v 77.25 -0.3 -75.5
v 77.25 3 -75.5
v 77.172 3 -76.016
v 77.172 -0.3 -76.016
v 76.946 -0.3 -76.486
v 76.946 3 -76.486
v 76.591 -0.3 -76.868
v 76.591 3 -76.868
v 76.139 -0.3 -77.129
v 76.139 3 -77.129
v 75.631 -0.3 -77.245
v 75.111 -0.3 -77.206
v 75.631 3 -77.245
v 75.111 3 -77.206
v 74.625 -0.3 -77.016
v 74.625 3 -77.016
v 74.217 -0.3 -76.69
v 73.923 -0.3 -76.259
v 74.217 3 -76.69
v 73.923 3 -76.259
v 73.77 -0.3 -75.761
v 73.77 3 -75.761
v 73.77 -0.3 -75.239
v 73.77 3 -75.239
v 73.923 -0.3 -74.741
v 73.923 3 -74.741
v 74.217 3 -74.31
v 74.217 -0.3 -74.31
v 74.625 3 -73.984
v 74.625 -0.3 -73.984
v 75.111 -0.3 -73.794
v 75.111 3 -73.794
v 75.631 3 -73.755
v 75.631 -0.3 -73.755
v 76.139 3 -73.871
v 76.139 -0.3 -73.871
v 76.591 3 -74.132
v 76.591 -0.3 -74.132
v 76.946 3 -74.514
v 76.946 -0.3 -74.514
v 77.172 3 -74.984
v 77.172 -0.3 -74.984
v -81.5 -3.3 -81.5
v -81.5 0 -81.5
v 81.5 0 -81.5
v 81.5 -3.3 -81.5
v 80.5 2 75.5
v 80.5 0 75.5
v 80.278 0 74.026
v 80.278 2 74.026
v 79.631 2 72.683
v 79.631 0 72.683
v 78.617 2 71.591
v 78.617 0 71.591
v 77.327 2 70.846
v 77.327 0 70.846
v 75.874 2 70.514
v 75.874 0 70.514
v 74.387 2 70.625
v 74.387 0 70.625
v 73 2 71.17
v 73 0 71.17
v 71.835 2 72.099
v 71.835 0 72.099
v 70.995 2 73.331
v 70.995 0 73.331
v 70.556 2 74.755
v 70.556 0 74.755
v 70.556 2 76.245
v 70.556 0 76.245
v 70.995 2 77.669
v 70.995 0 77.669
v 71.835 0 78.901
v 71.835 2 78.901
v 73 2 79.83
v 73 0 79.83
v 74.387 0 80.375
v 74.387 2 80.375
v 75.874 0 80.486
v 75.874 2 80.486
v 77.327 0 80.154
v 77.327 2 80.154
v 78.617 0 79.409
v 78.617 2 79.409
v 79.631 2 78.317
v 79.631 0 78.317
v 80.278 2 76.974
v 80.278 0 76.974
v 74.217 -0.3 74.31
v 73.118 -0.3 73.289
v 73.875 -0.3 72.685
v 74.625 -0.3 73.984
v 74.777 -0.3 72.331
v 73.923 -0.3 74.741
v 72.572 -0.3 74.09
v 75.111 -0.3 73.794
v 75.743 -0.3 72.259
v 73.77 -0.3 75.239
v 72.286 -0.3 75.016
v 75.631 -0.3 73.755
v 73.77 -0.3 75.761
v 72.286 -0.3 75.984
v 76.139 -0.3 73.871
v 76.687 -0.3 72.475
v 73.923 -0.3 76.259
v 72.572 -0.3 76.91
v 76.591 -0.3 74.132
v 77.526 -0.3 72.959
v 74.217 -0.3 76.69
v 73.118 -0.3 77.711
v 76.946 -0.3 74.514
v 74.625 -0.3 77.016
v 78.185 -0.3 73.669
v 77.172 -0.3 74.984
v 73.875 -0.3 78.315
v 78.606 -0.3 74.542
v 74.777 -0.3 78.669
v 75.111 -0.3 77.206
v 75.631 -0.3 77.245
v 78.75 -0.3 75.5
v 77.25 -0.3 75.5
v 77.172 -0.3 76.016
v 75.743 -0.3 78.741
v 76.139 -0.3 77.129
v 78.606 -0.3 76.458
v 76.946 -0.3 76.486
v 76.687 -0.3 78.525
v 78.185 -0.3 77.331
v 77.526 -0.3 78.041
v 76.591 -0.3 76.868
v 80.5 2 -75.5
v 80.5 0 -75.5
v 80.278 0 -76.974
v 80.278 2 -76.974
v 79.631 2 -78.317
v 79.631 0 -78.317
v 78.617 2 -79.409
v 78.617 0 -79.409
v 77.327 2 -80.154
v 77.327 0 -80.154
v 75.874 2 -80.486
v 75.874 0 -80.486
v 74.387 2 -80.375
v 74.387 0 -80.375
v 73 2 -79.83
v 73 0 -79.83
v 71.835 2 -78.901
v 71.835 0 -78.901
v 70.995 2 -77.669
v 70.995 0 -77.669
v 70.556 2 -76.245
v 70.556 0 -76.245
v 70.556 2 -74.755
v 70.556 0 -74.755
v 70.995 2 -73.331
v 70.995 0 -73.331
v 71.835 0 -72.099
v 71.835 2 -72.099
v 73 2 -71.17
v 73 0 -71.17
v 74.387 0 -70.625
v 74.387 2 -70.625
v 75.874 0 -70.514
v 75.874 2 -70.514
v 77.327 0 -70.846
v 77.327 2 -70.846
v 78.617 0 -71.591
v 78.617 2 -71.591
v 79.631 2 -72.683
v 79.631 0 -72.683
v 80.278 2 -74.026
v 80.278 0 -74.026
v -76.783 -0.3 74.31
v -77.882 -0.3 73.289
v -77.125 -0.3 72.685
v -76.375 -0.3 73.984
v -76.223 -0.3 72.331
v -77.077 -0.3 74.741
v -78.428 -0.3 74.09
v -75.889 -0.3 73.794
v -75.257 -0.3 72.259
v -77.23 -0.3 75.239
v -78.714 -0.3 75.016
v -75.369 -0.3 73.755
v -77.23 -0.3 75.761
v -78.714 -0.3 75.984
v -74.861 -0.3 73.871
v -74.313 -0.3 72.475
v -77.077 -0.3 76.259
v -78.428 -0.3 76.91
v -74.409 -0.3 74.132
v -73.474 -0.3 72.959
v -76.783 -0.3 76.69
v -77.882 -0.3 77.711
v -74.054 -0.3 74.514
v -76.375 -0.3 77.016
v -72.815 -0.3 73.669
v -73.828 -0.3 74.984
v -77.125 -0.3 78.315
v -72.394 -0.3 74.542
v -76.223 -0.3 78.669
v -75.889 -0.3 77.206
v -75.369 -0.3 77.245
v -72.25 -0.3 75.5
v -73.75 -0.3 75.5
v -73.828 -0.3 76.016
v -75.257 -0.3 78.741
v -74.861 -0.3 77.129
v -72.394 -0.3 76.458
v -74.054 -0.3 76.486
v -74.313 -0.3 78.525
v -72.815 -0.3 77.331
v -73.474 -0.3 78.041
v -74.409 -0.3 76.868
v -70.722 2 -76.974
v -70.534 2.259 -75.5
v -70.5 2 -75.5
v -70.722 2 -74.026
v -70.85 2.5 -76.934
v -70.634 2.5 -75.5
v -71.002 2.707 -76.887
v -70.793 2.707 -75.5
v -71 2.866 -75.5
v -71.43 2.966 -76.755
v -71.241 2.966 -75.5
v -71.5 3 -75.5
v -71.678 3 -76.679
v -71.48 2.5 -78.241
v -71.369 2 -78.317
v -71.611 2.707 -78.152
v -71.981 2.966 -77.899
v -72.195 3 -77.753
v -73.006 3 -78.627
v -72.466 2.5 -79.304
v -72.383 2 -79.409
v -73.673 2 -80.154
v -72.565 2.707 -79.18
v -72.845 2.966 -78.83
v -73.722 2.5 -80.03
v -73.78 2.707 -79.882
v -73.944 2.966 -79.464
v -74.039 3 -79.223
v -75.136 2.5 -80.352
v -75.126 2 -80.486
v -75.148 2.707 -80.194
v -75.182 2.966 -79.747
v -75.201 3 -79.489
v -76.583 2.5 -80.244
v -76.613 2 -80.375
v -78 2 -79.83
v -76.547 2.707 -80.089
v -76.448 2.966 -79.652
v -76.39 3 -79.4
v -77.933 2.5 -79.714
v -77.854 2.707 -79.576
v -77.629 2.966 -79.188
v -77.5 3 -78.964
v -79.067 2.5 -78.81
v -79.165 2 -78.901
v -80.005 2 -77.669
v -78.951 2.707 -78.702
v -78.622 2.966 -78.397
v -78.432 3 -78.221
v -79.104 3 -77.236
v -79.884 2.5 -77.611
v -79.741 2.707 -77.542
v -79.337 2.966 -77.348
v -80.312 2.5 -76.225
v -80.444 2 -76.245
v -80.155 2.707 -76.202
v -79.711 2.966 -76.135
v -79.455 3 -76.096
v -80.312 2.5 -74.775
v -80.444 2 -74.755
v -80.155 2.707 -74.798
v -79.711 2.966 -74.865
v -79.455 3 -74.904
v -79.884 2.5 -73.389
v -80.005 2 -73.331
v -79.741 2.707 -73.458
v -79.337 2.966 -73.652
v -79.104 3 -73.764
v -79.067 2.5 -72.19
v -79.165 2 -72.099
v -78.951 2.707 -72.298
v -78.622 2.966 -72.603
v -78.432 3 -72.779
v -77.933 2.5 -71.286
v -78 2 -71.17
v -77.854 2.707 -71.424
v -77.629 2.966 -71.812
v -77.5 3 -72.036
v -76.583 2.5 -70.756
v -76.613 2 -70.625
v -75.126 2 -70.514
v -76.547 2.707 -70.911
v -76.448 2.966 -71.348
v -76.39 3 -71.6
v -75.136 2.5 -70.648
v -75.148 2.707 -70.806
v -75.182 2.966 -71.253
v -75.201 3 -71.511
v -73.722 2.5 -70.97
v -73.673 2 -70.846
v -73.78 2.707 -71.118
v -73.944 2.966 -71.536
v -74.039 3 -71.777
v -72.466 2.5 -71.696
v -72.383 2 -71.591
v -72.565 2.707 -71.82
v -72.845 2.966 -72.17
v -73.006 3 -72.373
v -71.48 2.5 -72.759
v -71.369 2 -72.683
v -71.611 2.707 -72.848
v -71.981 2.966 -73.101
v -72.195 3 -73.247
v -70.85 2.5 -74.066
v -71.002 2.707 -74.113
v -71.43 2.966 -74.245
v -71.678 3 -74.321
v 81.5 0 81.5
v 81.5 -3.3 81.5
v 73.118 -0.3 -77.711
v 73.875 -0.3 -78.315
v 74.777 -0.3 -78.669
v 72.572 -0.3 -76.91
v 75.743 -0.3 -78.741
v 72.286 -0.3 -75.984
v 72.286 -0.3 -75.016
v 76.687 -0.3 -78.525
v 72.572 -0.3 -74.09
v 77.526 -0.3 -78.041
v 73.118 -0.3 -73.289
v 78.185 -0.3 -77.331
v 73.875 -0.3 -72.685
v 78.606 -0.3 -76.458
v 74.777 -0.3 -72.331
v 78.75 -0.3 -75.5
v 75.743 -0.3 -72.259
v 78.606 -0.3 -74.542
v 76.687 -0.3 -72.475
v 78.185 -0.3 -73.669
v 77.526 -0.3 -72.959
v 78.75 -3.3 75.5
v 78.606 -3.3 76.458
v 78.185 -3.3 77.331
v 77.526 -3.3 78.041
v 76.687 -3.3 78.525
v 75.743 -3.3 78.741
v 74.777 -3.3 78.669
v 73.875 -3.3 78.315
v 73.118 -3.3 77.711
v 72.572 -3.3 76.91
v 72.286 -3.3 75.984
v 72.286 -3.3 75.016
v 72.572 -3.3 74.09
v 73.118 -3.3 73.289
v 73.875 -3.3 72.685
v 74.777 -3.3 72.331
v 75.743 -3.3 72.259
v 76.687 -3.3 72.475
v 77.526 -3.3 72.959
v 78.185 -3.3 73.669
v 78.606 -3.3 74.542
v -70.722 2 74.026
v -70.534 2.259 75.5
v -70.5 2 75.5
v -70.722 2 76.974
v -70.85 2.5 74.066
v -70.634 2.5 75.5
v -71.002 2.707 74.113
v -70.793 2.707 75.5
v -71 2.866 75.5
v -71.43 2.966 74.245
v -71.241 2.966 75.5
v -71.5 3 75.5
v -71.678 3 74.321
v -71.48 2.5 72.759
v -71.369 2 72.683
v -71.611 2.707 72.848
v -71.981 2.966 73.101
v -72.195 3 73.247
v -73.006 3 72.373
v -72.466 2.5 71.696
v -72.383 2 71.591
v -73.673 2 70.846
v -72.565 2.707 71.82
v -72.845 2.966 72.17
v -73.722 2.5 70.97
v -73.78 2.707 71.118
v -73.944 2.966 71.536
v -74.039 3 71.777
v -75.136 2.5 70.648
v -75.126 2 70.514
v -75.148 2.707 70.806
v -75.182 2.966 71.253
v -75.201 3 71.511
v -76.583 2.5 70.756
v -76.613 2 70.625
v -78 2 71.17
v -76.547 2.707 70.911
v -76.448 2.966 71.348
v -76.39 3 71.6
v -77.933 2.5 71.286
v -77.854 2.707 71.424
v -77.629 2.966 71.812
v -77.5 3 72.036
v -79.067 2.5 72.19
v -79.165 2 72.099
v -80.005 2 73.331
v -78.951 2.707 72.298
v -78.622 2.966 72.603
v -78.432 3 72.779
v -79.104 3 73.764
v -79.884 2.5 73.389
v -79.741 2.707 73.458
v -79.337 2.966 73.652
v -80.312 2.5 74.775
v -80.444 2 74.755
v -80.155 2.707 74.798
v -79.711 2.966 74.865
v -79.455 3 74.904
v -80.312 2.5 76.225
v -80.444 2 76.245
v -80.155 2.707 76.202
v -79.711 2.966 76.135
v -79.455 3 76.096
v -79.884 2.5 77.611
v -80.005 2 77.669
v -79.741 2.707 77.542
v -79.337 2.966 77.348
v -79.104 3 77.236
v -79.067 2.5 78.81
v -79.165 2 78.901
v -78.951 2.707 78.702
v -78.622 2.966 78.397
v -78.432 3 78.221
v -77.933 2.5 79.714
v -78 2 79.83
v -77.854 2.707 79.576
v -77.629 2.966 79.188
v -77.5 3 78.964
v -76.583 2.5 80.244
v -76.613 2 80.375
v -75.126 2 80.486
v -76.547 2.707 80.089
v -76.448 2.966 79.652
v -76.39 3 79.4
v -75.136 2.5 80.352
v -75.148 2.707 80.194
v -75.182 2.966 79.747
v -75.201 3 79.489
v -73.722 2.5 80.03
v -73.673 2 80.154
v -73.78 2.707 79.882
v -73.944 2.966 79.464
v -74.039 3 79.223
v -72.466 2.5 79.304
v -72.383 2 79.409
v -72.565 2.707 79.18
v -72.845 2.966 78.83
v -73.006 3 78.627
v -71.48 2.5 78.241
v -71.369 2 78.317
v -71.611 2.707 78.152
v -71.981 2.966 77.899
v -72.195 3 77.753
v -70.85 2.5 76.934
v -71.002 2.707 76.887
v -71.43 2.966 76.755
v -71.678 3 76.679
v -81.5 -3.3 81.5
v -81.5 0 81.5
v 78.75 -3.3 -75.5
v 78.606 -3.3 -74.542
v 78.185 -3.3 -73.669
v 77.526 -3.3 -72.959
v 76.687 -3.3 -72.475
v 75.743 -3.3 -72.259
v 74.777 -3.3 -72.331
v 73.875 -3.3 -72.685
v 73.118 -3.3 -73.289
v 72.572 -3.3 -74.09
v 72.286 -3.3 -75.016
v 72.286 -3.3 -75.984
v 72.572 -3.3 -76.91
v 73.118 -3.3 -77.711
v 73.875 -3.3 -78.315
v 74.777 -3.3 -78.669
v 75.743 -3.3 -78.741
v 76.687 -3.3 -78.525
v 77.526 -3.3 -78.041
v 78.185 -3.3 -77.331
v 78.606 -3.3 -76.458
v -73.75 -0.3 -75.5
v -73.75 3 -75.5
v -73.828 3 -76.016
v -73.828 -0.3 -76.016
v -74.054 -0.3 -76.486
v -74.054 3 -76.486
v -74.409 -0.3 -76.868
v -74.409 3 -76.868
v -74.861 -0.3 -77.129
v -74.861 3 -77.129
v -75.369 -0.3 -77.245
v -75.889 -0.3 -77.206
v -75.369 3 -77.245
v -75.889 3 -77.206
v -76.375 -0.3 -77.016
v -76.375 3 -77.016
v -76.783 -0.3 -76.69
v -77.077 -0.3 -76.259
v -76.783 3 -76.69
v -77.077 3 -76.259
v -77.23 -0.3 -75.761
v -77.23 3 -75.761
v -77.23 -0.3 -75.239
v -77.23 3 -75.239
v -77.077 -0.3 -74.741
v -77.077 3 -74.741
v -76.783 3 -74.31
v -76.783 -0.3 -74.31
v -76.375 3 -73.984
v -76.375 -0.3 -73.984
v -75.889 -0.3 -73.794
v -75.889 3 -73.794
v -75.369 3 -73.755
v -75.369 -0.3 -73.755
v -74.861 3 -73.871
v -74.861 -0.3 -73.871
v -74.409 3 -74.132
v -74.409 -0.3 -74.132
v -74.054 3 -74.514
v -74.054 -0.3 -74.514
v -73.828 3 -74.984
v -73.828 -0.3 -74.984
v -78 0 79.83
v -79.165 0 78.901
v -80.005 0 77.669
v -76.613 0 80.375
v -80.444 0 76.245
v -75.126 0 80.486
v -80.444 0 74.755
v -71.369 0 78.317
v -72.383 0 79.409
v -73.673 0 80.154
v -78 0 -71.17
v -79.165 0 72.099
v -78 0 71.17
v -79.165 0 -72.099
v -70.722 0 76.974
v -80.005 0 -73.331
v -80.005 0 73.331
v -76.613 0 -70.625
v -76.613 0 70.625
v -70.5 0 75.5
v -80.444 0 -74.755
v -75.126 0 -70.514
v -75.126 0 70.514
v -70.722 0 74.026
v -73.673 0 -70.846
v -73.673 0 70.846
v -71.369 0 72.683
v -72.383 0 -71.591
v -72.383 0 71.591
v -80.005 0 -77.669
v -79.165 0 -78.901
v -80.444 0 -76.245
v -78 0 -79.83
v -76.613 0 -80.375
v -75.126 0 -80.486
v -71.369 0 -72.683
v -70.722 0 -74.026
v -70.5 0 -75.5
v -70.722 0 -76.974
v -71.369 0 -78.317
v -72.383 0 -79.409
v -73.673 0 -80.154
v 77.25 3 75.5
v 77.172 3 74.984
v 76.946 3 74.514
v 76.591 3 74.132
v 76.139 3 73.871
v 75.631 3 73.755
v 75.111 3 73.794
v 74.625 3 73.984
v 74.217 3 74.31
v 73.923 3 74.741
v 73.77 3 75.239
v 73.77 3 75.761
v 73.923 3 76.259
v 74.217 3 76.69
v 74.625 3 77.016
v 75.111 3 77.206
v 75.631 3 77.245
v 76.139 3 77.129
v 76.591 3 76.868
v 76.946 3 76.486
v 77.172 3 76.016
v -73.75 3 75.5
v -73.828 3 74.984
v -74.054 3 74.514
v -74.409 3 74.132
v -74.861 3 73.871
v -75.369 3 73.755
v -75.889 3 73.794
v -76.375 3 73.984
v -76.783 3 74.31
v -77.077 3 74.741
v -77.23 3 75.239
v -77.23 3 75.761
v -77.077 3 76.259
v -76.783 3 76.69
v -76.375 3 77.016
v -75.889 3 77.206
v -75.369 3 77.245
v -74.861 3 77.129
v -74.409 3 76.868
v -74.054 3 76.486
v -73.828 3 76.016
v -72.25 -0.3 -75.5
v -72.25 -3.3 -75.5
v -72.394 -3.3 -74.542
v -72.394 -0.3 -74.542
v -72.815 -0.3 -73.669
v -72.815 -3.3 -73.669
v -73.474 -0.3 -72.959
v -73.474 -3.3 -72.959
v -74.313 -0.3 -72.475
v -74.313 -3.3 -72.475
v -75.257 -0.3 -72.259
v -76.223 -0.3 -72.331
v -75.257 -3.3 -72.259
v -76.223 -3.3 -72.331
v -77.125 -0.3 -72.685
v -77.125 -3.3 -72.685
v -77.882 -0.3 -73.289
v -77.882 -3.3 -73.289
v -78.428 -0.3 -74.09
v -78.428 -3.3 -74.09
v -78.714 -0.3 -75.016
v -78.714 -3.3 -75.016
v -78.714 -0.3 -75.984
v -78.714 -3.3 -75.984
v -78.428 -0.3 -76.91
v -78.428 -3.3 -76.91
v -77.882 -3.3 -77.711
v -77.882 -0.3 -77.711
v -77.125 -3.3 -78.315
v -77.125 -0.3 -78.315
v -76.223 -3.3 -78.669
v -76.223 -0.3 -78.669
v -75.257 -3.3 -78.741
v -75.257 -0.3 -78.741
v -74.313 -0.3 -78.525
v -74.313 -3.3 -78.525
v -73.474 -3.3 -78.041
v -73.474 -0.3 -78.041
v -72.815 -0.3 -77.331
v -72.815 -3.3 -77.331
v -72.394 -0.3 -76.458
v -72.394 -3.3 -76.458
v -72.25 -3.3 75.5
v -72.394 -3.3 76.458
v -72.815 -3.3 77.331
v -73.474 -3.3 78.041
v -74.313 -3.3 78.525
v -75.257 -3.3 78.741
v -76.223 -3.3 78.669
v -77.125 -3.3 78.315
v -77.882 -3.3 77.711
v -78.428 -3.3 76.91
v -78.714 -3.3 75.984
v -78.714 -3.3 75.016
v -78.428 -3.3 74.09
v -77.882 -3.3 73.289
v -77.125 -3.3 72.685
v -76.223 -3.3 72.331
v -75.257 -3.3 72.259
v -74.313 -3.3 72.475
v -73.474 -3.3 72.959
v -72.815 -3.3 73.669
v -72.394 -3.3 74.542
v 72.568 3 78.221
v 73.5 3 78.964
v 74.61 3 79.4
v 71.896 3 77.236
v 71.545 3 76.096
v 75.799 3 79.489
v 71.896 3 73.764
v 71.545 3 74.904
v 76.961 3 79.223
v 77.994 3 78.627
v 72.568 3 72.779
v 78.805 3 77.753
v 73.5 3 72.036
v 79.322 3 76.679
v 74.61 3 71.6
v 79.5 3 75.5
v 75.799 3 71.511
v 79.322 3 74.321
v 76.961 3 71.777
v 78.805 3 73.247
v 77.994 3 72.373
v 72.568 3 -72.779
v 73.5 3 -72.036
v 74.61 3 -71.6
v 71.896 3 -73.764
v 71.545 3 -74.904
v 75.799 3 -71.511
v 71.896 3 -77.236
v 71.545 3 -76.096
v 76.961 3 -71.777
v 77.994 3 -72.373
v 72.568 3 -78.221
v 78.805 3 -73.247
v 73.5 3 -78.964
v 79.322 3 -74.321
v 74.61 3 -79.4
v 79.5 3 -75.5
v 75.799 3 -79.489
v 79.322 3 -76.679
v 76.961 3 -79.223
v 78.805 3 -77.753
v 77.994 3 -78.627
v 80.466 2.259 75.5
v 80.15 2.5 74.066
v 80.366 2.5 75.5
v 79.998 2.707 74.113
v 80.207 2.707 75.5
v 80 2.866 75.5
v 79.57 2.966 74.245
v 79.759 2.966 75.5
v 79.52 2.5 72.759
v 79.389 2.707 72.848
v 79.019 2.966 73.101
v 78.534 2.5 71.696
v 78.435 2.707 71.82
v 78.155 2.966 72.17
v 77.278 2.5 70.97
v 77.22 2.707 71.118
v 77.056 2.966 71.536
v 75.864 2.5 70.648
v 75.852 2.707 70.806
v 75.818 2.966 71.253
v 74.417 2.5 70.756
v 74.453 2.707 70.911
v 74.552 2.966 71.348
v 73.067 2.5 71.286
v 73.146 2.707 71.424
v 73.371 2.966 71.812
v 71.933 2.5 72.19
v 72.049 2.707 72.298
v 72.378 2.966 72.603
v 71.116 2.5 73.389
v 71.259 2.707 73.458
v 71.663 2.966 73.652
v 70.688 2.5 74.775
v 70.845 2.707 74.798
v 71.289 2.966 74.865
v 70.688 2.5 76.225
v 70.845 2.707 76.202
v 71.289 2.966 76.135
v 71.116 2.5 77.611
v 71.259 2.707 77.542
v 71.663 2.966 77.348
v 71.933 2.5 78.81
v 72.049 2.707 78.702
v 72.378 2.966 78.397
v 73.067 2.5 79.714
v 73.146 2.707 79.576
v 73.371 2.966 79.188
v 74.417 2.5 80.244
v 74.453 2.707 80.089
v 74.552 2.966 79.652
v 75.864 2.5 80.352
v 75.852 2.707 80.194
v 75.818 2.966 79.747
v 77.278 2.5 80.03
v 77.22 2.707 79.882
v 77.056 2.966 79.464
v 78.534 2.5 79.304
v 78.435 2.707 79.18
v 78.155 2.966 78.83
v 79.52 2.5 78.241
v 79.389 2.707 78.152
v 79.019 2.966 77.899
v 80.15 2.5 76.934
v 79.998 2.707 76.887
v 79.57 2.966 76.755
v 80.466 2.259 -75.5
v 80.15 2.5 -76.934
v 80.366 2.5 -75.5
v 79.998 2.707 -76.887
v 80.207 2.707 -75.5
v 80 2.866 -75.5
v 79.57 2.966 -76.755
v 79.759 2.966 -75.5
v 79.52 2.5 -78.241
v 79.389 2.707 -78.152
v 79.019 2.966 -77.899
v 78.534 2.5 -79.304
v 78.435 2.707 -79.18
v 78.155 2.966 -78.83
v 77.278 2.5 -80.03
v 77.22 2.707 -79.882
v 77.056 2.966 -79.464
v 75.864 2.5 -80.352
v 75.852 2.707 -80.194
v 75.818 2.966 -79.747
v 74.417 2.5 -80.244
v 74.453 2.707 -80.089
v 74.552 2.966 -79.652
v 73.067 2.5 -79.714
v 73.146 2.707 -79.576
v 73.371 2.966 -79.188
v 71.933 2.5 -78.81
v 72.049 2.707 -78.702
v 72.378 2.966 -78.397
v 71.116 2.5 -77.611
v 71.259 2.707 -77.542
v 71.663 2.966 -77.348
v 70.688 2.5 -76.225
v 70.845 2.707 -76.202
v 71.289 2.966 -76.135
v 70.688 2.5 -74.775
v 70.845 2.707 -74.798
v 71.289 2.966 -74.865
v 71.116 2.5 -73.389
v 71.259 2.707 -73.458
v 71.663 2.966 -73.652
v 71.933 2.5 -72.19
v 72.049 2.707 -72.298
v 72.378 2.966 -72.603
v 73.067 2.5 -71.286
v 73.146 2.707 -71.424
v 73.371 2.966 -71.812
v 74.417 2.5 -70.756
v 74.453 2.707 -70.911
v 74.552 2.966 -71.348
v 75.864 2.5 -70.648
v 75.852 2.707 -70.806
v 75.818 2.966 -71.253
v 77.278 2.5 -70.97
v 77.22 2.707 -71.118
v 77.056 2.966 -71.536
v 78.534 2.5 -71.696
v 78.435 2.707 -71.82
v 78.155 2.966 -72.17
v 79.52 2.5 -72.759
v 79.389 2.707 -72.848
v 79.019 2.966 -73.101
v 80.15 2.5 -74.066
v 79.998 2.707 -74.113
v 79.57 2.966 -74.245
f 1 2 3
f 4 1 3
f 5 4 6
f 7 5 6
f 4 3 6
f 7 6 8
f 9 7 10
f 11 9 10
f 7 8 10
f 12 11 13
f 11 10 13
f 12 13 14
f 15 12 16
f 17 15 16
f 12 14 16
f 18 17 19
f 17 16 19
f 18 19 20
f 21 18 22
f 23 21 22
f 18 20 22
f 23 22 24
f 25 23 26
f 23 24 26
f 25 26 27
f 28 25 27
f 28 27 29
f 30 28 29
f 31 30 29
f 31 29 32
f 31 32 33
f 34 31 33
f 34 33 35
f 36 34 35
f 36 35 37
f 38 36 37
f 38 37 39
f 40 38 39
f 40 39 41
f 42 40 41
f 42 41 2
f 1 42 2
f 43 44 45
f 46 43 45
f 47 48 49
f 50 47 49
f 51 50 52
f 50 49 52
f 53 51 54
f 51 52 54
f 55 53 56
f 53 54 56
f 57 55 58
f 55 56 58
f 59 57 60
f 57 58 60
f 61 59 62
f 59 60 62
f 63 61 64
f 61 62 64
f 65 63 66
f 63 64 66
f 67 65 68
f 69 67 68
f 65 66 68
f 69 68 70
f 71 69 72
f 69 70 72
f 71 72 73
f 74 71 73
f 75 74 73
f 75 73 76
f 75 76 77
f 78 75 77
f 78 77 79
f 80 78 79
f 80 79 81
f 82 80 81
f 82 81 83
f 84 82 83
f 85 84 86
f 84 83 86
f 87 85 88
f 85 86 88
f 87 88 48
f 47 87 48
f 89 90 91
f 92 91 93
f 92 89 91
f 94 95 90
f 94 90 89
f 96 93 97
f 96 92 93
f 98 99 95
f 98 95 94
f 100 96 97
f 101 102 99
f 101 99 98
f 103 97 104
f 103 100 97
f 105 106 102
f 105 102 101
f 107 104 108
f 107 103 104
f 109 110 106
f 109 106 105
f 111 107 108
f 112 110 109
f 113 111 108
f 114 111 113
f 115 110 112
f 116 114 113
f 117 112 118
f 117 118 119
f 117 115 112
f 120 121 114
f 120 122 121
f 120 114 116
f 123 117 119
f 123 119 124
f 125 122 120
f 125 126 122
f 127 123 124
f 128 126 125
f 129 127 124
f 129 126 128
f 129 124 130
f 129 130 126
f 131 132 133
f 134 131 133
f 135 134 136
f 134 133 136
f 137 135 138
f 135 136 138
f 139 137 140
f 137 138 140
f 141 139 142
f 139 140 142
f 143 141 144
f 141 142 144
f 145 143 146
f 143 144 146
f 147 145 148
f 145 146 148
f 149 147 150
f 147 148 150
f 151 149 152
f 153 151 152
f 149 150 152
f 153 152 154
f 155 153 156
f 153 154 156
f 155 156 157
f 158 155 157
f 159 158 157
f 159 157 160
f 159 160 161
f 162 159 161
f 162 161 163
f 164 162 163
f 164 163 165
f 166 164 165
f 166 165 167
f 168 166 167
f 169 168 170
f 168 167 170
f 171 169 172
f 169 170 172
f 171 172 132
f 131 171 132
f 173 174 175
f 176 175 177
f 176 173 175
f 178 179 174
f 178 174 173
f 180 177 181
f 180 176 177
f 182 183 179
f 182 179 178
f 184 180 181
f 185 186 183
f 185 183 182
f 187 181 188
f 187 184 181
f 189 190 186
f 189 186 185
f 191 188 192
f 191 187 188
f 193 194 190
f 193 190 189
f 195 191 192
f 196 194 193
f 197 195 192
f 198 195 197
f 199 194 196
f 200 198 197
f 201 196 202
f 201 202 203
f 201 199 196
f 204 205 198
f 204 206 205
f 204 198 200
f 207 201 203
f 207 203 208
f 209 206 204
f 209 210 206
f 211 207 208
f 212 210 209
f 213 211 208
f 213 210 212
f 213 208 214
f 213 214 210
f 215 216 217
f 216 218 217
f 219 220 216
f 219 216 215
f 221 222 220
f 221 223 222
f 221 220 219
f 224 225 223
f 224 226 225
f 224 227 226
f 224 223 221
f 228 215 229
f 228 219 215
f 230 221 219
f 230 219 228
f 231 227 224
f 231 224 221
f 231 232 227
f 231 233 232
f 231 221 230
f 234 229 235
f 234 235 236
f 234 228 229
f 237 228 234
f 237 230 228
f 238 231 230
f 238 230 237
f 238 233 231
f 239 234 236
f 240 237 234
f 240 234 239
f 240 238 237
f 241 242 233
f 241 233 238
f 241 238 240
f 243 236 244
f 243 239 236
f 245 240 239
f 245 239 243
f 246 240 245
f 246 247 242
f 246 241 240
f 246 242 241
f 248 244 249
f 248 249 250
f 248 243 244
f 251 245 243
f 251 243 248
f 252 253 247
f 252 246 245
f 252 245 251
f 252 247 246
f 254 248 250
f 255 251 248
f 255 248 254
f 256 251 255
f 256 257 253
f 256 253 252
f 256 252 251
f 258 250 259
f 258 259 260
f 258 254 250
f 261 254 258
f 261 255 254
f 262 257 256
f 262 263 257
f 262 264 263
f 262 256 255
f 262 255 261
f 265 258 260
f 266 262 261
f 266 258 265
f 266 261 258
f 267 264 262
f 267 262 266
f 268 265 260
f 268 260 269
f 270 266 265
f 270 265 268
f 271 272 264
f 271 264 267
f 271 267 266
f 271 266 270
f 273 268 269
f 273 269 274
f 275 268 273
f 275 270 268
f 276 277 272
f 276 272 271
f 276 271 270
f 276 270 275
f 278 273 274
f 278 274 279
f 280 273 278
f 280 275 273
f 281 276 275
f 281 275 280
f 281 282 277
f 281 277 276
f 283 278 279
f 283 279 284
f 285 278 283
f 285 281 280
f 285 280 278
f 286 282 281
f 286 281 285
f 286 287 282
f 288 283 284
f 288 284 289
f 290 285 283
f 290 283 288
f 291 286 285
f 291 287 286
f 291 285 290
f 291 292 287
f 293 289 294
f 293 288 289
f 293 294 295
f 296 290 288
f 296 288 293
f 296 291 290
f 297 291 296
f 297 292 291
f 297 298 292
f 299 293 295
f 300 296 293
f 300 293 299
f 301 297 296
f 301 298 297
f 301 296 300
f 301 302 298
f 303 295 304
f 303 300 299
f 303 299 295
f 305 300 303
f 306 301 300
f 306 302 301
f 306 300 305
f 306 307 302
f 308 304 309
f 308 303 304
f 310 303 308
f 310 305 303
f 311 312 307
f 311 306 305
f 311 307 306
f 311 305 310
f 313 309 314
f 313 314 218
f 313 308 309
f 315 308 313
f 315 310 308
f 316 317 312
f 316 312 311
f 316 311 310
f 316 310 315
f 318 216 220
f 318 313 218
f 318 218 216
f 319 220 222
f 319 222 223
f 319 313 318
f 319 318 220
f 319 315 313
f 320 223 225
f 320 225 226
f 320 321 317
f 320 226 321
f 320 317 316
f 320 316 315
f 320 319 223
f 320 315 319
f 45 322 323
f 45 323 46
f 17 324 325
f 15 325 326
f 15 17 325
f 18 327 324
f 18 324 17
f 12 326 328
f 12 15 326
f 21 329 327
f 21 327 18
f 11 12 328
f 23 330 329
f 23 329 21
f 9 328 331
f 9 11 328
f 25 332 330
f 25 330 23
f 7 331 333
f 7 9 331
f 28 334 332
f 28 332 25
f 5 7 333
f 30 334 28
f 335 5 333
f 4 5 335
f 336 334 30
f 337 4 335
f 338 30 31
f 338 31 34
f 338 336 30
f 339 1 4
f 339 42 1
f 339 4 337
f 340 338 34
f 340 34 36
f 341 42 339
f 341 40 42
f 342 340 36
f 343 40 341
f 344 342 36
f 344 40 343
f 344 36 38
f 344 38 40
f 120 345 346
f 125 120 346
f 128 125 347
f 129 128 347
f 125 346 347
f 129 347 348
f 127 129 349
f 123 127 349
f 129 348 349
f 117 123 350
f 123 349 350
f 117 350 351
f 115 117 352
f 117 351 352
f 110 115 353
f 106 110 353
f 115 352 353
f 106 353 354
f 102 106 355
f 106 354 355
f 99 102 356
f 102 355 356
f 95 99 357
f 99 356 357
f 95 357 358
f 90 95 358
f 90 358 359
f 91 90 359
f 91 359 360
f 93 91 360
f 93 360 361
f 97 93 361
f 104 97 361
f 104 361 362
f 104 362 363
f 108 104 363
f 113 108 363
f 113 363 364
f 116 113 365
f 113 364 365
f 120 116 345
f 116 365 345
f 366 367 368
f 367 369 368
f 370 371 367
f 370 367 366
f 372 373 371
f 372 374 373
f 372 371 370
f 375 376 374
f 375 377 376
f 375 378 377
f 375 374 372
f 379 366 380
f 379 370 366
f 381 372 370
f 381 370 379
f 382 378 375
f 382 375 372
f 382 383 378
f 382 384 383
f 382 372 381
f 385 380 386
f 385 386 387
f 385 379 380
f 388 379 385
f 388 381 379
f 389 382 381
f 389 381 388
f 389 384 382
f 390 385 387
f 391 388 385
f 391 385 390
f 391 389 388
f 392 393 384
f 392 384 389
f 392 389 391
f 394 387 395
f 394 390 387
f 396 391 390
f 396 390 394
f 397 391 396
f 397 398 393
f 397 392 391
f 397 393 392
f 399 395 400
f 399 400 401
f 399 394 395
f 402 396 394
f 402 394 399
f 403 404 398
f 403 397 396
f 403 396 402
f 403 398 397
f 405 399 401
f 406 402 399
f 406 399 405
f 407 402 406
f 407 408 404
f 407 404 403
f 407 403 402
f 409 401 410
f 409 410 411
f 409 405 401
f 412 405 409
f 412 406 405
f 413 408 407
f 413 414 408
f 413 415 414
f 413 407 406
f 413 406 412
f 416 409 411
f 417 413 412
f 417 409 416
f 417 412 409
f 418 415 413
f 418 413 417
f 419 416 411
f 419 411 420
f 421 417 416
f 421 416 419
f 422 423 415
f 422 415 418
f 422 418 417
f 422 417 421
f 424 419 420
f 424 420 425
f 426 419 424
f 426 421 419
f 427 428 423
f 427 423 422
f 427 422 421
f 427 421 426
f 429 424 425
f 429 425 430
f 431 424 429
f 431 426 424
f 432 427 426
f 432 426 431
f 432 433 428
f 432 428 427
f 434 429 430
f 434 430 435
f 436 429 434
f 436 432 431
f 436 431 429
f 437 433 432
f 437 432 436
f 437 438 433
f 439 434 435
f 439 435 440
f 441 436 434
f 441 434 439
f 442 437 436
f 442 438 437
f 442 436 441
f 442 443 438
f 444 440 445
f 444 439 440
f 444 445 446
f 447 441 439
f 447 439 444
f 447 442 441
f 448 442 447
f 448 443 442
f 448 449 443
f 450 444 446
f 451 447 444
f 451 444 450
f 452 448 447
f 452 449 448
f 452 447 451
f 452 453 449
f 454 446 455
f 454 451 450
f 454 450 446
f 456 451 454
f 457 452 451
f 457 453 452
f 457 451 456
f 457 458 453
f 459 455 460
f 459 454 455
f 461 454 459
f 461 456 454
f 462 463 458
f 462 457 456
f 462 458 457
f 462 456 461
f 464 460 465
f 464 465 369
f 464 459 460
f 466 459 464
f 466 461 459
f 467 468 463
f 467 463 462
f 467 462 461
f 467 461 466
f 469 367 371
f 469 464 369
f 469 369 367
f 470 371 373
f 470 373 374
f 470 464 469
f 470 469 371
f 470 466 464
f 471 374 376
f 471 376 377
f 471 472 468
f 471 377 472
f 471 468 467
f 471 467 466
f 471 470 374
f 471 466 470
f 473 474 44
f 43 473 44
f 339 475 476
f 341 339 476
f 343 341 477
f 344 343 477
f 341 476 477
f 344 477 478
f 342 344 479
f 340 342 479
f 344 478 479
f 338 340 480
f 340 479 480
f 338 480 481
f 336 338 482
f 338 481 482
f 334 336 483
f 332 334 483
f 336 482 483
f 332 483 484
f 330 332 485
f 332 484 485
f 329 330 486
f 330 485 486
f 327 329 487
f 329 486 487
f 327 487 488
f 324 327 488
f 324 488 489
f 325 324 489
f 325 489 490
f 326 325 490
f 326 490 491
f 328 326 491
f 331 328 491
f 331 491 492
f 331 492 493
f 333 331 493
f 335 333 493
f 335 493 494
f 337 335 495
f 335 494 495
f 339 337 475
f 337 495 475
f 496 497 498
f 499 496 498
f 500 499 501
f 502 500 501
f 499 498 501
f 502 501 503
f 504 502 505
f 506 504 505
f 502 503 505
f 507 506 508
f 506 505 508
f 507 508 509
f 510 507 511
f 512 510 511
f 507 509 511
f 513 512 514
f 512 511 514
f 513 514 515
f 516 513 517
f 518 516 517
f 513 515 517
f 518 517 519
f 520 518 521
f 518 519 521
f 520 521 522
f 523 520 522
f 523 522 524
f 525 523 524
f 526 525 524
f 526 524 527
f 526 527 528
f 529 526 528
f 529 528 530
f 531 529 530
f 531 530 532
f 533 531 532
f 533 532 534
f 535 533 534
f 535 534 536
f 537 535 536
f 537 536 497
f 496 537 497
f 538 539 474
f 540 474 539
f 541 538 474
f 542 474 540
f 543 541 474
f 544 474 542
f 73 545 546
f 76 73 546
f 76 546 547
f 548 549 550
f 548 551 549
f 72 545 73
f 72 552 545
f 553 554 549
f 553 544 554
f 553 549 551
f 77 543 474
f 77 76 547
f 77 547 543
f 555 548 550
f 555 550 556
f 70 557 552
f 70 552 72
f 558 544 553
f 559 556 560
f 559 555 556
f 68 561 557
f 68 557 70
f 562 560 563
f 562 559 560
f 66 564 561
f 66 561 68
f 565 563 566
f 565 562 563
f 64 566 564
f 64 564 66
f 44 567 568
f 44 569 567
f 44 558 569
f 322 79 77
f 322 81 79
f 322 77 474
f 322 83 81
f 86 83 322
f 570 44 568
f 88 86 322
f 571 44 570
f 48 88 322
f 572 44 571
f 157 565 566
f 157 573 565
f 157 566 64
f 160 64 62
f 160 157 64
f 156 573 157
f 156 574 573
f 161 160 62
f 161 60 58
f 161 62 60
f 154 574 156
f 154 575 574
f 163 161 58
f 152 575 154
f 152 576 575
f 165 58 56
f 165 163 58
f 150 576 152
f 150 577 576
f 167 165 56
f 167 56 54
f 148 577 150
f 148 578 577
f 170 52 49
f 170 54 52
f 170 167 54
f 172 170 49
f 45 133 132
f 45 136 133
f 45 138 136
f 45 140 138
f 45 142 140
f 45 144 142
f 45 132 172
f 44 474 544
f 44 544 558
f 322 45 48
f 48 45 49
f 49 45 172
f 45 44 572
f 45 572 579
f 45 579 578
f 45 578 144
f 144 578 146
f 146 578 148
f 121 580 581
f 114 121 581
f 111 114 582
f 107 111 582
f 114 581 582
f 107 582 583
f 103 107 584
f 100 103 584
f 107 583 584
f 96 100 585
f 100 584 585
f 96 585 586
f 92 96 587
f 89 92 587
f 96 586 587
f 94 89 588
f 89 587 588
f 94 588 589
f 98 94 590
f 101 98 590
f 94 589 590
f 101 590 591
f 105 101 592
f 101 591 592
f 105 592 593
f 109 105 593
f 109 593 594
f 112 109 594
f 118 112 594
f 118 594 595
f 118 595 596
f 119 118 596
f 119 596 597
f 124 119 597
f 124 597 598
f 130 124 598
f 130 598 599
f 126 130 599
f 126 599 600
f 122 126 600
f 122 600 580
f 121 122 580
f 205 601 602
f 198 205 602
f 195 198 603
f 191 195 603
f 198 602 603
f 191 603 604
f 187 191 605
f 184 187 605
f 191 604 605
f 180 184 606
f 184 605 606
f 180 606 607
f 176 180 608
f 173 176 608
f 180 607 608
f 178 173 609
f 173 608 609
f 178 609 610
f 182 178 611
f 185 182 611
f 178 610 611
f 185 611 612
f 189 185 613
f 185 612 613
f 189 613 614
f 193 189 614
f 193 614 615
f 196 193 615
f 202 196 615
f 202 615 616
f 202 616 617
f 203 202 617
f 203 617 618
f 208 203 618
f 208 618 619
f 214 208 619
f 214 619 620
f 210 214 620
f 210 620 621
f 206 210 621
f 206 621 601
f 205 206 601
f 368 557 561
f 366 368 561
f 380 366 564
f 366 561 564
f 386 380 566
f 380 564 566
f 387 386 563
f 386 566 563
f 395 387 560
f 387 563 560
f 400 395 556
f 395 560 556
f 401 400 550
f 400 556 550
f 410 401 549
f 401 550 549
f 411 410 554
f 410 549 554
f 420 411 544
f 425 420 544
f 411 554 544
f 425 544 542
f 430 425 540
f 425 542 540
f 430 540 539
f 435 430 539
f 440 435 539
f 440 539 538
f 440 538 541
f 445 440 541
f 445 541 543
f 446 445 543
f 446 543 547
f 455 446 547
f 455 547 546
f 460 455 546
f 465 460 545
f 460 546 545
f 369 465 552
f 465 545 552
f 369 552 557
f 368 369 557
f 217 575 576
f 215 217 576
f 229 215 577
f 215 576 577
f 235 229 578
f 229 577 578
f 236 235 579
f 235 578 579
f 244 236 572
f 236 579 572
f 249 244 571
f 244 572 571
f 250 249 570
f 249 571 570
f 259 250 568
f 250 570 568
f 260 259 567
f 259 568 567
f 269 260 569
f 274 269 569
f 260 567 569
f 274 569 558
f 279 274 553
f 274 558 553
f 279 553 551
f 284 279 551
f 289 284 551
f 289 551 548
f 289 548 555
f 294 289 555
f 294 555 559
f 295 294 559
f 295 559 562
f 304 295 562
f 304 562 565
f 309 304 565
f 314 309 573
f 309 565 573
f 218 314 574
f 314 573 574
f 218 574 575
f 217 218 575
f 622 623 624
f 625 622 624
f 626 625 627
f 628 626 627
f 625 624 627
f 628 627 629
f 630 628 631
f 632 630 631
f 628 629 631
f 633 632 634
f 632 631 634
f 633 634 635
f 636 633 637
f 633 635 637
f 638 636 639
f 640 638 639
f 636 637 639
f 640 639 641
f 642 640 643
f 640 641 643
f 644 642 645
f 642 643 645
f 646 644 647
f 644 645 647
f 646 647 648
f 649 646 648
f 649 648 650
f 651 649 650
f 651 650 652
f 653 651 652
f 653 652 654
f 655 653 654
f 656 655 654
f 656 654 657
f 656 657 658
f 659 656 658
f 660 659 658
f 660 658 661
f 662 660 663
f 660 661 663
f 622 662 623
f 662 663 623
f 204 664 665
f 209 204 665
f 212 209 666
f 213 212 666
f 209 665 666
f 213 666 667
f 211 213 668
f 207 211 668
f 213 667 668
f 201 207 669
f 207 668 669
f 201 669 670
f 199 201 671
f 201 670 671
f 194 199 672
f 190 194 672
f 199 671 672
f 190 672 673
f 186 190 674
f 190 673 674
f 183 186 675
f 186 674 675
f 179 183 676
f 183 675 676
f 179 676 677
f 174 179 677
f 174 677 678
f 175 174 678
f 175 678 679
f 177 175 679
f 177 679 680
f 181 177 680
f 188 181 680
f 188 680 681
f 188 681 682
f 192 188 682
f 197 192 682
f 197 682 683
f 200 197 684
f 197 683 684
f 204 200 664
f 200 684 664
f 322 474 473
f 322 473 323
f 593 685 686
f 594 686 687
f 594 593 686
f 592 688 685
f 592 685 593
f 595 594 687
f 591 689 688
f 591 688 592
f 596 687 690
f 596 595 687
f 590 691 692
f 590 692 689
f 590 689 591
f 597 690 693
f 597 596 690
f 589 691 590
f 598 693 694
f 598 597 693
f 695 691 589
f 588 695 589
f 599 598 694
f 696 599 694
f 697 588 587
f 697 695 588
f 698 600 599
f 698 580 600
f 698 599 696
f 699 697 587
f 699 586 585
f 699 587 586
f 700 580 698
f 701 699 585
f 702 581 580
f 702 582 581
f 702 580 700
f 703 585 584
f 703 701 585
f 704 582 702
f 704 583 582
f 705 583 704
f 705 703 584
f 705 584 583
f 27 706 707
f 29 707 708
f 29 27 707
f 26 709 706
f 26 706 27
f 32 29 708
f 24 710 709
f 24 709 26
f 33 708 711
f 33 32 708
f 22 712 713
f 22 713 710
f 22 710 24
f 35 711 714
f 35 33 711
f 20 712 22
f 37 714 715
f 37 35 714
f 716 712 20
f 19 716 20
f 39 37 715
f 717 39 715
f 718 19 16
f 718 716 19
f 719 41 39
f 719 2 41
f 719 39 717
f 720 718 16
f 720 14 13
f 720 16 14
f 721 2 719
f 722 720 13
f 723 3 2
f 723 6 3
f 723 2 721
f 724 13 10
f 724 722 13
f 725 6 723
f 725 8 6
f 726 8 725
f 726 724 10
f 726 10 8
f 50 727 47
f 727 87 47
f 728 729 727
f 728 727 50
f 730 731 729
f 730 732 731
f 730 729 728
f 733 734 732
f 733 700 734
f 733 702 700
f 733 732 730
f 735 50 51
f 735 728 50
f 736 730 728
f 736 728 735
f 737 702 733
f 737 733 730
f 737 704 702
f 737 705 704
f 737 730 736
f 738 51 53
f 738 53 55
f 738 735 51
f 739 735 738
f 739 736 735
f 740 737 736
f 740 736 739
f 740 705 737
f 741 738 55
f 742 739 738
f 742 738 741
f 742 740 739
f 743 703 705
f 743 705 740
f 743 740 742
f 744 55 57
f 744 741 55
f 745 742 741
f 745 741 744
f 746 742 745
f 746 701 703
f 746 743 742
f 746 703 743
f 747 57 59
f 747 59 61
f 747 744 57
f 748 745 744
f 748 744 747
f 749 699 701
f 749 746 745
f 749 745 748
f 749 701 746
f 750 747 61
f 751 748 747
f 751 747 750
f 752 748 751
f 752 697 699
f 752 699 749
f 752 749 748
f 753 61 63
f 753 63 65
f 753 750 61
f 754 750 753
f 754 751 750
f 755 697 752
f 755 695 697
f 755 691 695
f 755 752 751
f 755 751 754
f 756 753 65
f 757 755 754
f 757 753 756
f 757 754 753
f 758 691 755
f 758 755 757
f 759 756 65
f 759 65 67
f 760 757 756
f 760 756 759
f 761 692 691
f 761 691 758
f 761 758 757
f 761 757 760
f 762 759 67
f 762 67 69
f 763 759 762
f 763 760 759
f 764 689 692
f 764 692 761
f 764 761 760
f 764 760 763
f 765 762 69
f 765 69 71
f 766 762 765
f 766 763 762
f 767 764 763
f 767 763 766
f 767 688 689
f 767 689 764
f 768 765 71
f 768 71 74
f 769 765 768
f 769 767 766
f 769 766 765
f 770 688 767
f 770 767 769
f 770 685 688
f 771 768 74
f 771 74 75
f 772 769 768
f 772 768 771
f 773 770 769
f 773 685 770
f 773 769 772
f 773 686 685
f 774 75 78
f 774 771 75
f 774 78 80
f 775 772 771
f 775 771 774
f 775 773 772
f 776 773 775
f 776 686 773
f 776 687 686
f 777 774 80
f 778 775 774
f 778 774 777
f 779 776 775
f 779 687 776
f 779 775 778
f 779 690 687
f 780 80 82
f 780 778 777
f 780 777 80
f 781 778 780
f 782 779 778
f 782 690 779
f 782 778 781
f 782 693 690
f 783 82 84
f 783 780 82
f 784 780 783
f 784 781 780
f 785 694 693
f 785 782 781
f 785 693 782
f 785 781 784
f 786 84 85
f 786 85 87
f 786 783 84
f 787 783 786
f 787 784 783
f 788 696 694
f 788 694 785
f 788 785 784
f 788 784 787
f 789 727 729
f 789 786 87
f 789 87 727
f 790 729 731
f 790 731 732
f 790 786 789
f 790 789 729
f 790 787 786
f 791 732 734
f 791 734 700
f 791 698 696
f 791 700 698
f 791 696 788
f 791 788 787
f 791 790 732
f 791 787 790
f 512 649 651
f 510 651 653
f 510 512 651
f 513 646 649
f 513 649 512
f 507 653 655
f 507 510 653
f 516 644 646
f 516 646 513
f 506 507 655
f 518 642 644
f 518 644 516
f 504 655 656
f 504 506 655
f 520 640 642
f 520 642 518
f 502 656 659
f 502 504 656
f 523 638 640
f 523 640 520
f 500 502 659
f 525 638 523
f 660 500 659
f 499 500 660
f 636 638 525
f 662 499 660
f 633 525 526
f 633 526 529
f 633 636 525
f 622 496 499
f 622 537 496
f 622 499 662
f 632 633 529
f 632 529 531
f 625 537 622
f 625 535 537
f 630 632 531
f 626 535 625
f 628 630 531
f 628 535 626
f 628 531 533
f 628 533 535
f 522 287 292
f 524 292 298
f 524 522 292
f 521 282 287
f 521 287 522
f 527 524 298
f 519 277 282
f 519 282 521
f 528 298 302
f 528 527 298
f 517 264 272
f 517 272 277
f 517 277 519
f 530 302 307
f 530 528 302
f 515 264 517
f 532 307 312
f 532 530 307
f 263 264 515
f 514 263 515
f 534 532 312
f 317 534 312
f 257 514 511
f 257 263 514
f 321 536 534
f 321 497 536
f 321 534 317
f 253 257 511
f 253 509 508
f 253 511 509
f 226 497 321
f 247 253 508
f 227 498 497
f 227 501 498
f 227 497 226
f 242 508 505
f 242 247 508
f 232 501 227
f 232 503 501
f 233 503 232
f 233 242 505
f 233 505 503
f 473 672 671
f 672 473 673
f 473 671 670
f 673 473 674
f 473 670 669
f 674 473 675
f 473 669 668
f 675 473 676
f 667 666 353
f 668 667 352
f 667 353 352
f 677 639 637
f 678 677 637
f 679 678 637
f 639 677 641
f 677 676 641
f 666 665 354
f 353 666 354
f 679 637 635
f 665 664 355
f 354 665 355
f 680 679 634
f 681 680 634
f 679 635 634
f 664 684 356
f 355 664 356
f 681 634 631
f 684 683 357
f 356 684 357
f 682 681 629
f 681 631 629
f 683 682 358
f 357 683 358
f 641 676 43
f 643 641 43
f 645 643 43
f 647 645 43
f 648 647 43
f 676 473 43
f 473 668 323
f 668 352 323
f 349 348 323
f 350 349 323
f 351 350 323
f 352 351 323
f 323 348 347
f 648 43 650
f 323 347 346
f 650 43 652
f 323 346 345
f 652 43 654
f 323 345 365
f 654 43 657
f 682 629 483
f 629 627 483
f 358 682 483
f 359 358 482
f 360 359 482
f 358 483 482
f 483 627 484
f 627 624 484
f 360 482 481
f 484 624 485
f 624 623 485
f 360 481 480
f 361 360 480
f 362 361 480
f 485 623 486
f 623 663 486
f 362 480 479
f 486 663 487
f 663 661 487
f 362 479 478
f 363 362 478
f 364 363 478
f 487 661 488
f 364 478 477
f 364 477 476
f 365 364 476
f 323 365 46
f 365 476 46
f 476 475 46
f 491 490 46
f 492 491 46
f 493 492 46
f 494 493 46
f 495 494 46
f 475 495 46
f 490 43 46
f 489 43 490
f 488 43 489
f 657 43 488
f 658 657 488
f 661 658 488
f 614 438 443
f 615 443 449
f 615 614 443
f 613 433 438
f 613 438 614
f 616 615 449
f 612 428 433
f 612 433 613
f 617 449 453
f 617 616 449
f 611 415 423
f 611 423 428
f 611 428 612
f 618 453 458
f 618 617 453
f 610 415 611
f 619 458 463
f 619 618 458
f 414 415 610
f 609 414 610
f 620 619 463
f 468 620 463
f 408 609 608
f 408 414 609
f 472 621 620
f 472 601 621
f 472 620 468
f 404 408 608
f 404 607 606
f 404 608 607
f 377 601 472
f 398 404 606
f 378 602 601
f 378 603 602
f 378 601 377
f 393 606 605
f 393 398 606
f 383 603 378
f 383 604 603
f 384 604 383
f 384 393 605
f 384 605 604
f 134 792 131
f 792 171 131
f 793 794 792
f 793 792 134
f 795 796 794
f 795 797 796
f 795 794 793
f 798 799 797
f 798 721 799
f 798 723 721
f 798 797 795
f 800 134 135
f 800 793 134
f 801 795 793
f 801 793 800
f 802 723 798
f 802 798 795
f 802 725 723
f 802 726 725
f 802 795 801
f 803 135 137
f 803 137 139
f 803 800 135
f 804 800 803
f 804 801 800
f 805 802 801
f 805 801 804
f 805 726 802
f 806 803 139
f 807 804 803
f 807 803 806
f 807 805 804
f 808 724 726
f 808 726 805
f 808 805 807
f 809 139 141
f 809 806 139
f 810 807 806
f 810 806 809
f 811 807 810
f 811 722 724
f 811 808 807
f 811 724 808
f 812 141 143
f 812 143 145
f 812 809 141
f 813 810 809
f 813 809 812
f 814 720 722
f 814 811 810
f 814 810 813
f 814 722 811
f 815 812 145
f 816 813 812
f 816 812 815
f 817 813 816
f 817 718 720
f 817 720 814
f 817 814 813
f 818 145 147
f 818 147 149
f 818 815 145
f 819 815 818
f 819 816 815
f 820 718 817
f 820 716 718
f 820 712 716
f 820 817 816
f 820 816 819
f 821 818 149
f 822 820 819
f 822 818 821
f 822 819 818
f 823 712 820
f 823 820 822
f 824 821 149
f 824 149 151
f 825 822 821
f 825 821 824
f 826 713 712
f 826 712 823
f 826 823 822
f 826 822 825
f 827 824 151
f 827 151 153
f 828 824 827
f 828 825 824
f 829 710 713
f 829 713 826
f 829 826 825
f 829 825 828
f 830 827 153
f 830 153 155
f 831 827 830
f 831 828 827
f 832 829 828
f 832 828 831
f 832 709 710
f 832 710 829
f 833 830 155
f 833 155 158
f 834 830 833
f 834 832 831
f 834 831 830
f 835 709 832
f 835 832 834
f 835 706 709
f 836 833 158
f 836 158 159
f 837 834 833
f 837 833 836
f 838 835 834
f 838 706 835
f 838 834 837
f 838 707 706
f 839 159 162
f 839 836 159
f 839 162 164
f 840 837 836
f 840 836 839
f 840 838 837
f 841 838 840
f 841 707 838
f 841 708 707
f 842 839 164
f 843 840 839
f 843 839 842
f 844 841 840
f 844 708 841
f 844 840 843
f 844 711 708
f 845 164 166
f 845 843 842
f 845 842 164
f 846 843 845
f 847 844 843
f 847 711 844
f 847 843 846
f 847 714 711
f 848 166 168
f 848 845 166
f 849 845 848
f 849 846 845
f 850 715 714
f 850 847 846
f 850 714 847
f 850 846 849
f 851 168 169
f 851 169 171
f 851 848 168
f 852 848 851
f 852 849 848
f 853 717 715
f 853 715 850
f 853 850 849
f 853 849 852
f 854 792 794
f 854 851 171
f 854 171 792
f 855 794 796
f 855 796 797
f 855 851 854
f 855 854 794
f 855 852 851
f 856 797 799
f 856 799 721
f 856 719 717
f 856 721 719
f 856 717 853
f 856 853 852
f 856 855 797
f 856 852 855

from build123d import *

# Parameters (mm, degrees)
CROQUIS1_W              = 163
CROQUIS1_H              = 163
SALIENTE_EXTRUIR1_DEPTH = 3.3
CROQUIS2_R              = 5
SALIENTE_EXTRUIR2_DEPTH = 3
REDONDEO1_R             = 1
CROQUIS3_R              = 3.25
CORTAR_EXTRUIR1_DEPTH   = 3
CROQUIS4_R              = 1.75
CORTAR_EXTRUIR2_DEPTH   = 6.3


with BuildPart() as part:
    # Croquis1 → Saliente-Extruir1 (new body)
    with BuildSketch(Plane(origin=(0, 0, 0), x_dir=(1, 0, 0), z_dir=(0, 1, 0))):
        Rectangle(CROQUIS1_W, CROQUIS1_H)
    extrude(amount=-SALIENTE_EXTRUIR1_DEPTH)

    # Croquis2 → Saliente-Extruir2 (add)
    with BuildSketch(Plane(origin=(0, 0, 0), x_dir=(1, 0, 0), z_dir=(0, 1, 0))):
        with Locations((-75.5, 75.5)):
            Circle(CROQUIS2_R)
        with Locations((75.5, 75.5)):
            Circle(CROQUIS2_R)
        with Locations((-75.5, -75.5)):
            Circle(CROQUIS2_R)
        with Locations((75.5, -75.5)):
            Circle(CROQUIS2_R)
    extrude(amount=SALIENTE_EXTRUIR2_DEPTH)

    # Redondeo1
    redondeo1_edges = [part.edges().sort_by_distance(p)[0] for p in [
        (70.5, 3, -75.5),
        (-80.5, 3, 75.5),
        (70.5, 3, 75.5),
        (-80.5, 3, -75.5),
    ]]
    fillet(redondeo1_edges, radius=REDONDEO1_R)

    # Croquis3 → Cortar-Extruir1 (cut)
    with BuildSketch(Plane.XZ.offset(3.3)):
        with Locations((-75.5, 75.5)):
            Circle(CROQUIS3_R)
        with Locations((75.5, 75.5)):
            Circle(CROQUIS3_R)
        with Locations((-75.5, -75.5)):
            Circle(CROQUIS3_R)
        with Locations((75.5, -75.5)):
            Circle(CROQUIS3_R)
    extrude(amount=-CORTAR_EXTRUIR1_DEPTH, mode=Mode.SUBTRACT)

    # Croquis4 → Cortar-Extruir2 (cut)
    with BuildSketch(Plane(origin=(0, 3, 0), x_dir=(1, 0, 0), z_dir=(0, 1, 0))):
        with Locations((75.5, -75.5)):
            Circle(CROQUIS4_R)
        with Locations((75.5, 75.5)):
            Circle(CROQUIS4_R)
        with Locations((-75.5, 75.5)):
            Circle(CROQUIS4_R)
        with Locations((-75.5, -75.5)):
            Circle(CROQUIS4_R)
    extrude(amount=-CORTAR_EXTRUIR2_DEPTH, mode=Mode.SUBTRACT)


solid = part.part
